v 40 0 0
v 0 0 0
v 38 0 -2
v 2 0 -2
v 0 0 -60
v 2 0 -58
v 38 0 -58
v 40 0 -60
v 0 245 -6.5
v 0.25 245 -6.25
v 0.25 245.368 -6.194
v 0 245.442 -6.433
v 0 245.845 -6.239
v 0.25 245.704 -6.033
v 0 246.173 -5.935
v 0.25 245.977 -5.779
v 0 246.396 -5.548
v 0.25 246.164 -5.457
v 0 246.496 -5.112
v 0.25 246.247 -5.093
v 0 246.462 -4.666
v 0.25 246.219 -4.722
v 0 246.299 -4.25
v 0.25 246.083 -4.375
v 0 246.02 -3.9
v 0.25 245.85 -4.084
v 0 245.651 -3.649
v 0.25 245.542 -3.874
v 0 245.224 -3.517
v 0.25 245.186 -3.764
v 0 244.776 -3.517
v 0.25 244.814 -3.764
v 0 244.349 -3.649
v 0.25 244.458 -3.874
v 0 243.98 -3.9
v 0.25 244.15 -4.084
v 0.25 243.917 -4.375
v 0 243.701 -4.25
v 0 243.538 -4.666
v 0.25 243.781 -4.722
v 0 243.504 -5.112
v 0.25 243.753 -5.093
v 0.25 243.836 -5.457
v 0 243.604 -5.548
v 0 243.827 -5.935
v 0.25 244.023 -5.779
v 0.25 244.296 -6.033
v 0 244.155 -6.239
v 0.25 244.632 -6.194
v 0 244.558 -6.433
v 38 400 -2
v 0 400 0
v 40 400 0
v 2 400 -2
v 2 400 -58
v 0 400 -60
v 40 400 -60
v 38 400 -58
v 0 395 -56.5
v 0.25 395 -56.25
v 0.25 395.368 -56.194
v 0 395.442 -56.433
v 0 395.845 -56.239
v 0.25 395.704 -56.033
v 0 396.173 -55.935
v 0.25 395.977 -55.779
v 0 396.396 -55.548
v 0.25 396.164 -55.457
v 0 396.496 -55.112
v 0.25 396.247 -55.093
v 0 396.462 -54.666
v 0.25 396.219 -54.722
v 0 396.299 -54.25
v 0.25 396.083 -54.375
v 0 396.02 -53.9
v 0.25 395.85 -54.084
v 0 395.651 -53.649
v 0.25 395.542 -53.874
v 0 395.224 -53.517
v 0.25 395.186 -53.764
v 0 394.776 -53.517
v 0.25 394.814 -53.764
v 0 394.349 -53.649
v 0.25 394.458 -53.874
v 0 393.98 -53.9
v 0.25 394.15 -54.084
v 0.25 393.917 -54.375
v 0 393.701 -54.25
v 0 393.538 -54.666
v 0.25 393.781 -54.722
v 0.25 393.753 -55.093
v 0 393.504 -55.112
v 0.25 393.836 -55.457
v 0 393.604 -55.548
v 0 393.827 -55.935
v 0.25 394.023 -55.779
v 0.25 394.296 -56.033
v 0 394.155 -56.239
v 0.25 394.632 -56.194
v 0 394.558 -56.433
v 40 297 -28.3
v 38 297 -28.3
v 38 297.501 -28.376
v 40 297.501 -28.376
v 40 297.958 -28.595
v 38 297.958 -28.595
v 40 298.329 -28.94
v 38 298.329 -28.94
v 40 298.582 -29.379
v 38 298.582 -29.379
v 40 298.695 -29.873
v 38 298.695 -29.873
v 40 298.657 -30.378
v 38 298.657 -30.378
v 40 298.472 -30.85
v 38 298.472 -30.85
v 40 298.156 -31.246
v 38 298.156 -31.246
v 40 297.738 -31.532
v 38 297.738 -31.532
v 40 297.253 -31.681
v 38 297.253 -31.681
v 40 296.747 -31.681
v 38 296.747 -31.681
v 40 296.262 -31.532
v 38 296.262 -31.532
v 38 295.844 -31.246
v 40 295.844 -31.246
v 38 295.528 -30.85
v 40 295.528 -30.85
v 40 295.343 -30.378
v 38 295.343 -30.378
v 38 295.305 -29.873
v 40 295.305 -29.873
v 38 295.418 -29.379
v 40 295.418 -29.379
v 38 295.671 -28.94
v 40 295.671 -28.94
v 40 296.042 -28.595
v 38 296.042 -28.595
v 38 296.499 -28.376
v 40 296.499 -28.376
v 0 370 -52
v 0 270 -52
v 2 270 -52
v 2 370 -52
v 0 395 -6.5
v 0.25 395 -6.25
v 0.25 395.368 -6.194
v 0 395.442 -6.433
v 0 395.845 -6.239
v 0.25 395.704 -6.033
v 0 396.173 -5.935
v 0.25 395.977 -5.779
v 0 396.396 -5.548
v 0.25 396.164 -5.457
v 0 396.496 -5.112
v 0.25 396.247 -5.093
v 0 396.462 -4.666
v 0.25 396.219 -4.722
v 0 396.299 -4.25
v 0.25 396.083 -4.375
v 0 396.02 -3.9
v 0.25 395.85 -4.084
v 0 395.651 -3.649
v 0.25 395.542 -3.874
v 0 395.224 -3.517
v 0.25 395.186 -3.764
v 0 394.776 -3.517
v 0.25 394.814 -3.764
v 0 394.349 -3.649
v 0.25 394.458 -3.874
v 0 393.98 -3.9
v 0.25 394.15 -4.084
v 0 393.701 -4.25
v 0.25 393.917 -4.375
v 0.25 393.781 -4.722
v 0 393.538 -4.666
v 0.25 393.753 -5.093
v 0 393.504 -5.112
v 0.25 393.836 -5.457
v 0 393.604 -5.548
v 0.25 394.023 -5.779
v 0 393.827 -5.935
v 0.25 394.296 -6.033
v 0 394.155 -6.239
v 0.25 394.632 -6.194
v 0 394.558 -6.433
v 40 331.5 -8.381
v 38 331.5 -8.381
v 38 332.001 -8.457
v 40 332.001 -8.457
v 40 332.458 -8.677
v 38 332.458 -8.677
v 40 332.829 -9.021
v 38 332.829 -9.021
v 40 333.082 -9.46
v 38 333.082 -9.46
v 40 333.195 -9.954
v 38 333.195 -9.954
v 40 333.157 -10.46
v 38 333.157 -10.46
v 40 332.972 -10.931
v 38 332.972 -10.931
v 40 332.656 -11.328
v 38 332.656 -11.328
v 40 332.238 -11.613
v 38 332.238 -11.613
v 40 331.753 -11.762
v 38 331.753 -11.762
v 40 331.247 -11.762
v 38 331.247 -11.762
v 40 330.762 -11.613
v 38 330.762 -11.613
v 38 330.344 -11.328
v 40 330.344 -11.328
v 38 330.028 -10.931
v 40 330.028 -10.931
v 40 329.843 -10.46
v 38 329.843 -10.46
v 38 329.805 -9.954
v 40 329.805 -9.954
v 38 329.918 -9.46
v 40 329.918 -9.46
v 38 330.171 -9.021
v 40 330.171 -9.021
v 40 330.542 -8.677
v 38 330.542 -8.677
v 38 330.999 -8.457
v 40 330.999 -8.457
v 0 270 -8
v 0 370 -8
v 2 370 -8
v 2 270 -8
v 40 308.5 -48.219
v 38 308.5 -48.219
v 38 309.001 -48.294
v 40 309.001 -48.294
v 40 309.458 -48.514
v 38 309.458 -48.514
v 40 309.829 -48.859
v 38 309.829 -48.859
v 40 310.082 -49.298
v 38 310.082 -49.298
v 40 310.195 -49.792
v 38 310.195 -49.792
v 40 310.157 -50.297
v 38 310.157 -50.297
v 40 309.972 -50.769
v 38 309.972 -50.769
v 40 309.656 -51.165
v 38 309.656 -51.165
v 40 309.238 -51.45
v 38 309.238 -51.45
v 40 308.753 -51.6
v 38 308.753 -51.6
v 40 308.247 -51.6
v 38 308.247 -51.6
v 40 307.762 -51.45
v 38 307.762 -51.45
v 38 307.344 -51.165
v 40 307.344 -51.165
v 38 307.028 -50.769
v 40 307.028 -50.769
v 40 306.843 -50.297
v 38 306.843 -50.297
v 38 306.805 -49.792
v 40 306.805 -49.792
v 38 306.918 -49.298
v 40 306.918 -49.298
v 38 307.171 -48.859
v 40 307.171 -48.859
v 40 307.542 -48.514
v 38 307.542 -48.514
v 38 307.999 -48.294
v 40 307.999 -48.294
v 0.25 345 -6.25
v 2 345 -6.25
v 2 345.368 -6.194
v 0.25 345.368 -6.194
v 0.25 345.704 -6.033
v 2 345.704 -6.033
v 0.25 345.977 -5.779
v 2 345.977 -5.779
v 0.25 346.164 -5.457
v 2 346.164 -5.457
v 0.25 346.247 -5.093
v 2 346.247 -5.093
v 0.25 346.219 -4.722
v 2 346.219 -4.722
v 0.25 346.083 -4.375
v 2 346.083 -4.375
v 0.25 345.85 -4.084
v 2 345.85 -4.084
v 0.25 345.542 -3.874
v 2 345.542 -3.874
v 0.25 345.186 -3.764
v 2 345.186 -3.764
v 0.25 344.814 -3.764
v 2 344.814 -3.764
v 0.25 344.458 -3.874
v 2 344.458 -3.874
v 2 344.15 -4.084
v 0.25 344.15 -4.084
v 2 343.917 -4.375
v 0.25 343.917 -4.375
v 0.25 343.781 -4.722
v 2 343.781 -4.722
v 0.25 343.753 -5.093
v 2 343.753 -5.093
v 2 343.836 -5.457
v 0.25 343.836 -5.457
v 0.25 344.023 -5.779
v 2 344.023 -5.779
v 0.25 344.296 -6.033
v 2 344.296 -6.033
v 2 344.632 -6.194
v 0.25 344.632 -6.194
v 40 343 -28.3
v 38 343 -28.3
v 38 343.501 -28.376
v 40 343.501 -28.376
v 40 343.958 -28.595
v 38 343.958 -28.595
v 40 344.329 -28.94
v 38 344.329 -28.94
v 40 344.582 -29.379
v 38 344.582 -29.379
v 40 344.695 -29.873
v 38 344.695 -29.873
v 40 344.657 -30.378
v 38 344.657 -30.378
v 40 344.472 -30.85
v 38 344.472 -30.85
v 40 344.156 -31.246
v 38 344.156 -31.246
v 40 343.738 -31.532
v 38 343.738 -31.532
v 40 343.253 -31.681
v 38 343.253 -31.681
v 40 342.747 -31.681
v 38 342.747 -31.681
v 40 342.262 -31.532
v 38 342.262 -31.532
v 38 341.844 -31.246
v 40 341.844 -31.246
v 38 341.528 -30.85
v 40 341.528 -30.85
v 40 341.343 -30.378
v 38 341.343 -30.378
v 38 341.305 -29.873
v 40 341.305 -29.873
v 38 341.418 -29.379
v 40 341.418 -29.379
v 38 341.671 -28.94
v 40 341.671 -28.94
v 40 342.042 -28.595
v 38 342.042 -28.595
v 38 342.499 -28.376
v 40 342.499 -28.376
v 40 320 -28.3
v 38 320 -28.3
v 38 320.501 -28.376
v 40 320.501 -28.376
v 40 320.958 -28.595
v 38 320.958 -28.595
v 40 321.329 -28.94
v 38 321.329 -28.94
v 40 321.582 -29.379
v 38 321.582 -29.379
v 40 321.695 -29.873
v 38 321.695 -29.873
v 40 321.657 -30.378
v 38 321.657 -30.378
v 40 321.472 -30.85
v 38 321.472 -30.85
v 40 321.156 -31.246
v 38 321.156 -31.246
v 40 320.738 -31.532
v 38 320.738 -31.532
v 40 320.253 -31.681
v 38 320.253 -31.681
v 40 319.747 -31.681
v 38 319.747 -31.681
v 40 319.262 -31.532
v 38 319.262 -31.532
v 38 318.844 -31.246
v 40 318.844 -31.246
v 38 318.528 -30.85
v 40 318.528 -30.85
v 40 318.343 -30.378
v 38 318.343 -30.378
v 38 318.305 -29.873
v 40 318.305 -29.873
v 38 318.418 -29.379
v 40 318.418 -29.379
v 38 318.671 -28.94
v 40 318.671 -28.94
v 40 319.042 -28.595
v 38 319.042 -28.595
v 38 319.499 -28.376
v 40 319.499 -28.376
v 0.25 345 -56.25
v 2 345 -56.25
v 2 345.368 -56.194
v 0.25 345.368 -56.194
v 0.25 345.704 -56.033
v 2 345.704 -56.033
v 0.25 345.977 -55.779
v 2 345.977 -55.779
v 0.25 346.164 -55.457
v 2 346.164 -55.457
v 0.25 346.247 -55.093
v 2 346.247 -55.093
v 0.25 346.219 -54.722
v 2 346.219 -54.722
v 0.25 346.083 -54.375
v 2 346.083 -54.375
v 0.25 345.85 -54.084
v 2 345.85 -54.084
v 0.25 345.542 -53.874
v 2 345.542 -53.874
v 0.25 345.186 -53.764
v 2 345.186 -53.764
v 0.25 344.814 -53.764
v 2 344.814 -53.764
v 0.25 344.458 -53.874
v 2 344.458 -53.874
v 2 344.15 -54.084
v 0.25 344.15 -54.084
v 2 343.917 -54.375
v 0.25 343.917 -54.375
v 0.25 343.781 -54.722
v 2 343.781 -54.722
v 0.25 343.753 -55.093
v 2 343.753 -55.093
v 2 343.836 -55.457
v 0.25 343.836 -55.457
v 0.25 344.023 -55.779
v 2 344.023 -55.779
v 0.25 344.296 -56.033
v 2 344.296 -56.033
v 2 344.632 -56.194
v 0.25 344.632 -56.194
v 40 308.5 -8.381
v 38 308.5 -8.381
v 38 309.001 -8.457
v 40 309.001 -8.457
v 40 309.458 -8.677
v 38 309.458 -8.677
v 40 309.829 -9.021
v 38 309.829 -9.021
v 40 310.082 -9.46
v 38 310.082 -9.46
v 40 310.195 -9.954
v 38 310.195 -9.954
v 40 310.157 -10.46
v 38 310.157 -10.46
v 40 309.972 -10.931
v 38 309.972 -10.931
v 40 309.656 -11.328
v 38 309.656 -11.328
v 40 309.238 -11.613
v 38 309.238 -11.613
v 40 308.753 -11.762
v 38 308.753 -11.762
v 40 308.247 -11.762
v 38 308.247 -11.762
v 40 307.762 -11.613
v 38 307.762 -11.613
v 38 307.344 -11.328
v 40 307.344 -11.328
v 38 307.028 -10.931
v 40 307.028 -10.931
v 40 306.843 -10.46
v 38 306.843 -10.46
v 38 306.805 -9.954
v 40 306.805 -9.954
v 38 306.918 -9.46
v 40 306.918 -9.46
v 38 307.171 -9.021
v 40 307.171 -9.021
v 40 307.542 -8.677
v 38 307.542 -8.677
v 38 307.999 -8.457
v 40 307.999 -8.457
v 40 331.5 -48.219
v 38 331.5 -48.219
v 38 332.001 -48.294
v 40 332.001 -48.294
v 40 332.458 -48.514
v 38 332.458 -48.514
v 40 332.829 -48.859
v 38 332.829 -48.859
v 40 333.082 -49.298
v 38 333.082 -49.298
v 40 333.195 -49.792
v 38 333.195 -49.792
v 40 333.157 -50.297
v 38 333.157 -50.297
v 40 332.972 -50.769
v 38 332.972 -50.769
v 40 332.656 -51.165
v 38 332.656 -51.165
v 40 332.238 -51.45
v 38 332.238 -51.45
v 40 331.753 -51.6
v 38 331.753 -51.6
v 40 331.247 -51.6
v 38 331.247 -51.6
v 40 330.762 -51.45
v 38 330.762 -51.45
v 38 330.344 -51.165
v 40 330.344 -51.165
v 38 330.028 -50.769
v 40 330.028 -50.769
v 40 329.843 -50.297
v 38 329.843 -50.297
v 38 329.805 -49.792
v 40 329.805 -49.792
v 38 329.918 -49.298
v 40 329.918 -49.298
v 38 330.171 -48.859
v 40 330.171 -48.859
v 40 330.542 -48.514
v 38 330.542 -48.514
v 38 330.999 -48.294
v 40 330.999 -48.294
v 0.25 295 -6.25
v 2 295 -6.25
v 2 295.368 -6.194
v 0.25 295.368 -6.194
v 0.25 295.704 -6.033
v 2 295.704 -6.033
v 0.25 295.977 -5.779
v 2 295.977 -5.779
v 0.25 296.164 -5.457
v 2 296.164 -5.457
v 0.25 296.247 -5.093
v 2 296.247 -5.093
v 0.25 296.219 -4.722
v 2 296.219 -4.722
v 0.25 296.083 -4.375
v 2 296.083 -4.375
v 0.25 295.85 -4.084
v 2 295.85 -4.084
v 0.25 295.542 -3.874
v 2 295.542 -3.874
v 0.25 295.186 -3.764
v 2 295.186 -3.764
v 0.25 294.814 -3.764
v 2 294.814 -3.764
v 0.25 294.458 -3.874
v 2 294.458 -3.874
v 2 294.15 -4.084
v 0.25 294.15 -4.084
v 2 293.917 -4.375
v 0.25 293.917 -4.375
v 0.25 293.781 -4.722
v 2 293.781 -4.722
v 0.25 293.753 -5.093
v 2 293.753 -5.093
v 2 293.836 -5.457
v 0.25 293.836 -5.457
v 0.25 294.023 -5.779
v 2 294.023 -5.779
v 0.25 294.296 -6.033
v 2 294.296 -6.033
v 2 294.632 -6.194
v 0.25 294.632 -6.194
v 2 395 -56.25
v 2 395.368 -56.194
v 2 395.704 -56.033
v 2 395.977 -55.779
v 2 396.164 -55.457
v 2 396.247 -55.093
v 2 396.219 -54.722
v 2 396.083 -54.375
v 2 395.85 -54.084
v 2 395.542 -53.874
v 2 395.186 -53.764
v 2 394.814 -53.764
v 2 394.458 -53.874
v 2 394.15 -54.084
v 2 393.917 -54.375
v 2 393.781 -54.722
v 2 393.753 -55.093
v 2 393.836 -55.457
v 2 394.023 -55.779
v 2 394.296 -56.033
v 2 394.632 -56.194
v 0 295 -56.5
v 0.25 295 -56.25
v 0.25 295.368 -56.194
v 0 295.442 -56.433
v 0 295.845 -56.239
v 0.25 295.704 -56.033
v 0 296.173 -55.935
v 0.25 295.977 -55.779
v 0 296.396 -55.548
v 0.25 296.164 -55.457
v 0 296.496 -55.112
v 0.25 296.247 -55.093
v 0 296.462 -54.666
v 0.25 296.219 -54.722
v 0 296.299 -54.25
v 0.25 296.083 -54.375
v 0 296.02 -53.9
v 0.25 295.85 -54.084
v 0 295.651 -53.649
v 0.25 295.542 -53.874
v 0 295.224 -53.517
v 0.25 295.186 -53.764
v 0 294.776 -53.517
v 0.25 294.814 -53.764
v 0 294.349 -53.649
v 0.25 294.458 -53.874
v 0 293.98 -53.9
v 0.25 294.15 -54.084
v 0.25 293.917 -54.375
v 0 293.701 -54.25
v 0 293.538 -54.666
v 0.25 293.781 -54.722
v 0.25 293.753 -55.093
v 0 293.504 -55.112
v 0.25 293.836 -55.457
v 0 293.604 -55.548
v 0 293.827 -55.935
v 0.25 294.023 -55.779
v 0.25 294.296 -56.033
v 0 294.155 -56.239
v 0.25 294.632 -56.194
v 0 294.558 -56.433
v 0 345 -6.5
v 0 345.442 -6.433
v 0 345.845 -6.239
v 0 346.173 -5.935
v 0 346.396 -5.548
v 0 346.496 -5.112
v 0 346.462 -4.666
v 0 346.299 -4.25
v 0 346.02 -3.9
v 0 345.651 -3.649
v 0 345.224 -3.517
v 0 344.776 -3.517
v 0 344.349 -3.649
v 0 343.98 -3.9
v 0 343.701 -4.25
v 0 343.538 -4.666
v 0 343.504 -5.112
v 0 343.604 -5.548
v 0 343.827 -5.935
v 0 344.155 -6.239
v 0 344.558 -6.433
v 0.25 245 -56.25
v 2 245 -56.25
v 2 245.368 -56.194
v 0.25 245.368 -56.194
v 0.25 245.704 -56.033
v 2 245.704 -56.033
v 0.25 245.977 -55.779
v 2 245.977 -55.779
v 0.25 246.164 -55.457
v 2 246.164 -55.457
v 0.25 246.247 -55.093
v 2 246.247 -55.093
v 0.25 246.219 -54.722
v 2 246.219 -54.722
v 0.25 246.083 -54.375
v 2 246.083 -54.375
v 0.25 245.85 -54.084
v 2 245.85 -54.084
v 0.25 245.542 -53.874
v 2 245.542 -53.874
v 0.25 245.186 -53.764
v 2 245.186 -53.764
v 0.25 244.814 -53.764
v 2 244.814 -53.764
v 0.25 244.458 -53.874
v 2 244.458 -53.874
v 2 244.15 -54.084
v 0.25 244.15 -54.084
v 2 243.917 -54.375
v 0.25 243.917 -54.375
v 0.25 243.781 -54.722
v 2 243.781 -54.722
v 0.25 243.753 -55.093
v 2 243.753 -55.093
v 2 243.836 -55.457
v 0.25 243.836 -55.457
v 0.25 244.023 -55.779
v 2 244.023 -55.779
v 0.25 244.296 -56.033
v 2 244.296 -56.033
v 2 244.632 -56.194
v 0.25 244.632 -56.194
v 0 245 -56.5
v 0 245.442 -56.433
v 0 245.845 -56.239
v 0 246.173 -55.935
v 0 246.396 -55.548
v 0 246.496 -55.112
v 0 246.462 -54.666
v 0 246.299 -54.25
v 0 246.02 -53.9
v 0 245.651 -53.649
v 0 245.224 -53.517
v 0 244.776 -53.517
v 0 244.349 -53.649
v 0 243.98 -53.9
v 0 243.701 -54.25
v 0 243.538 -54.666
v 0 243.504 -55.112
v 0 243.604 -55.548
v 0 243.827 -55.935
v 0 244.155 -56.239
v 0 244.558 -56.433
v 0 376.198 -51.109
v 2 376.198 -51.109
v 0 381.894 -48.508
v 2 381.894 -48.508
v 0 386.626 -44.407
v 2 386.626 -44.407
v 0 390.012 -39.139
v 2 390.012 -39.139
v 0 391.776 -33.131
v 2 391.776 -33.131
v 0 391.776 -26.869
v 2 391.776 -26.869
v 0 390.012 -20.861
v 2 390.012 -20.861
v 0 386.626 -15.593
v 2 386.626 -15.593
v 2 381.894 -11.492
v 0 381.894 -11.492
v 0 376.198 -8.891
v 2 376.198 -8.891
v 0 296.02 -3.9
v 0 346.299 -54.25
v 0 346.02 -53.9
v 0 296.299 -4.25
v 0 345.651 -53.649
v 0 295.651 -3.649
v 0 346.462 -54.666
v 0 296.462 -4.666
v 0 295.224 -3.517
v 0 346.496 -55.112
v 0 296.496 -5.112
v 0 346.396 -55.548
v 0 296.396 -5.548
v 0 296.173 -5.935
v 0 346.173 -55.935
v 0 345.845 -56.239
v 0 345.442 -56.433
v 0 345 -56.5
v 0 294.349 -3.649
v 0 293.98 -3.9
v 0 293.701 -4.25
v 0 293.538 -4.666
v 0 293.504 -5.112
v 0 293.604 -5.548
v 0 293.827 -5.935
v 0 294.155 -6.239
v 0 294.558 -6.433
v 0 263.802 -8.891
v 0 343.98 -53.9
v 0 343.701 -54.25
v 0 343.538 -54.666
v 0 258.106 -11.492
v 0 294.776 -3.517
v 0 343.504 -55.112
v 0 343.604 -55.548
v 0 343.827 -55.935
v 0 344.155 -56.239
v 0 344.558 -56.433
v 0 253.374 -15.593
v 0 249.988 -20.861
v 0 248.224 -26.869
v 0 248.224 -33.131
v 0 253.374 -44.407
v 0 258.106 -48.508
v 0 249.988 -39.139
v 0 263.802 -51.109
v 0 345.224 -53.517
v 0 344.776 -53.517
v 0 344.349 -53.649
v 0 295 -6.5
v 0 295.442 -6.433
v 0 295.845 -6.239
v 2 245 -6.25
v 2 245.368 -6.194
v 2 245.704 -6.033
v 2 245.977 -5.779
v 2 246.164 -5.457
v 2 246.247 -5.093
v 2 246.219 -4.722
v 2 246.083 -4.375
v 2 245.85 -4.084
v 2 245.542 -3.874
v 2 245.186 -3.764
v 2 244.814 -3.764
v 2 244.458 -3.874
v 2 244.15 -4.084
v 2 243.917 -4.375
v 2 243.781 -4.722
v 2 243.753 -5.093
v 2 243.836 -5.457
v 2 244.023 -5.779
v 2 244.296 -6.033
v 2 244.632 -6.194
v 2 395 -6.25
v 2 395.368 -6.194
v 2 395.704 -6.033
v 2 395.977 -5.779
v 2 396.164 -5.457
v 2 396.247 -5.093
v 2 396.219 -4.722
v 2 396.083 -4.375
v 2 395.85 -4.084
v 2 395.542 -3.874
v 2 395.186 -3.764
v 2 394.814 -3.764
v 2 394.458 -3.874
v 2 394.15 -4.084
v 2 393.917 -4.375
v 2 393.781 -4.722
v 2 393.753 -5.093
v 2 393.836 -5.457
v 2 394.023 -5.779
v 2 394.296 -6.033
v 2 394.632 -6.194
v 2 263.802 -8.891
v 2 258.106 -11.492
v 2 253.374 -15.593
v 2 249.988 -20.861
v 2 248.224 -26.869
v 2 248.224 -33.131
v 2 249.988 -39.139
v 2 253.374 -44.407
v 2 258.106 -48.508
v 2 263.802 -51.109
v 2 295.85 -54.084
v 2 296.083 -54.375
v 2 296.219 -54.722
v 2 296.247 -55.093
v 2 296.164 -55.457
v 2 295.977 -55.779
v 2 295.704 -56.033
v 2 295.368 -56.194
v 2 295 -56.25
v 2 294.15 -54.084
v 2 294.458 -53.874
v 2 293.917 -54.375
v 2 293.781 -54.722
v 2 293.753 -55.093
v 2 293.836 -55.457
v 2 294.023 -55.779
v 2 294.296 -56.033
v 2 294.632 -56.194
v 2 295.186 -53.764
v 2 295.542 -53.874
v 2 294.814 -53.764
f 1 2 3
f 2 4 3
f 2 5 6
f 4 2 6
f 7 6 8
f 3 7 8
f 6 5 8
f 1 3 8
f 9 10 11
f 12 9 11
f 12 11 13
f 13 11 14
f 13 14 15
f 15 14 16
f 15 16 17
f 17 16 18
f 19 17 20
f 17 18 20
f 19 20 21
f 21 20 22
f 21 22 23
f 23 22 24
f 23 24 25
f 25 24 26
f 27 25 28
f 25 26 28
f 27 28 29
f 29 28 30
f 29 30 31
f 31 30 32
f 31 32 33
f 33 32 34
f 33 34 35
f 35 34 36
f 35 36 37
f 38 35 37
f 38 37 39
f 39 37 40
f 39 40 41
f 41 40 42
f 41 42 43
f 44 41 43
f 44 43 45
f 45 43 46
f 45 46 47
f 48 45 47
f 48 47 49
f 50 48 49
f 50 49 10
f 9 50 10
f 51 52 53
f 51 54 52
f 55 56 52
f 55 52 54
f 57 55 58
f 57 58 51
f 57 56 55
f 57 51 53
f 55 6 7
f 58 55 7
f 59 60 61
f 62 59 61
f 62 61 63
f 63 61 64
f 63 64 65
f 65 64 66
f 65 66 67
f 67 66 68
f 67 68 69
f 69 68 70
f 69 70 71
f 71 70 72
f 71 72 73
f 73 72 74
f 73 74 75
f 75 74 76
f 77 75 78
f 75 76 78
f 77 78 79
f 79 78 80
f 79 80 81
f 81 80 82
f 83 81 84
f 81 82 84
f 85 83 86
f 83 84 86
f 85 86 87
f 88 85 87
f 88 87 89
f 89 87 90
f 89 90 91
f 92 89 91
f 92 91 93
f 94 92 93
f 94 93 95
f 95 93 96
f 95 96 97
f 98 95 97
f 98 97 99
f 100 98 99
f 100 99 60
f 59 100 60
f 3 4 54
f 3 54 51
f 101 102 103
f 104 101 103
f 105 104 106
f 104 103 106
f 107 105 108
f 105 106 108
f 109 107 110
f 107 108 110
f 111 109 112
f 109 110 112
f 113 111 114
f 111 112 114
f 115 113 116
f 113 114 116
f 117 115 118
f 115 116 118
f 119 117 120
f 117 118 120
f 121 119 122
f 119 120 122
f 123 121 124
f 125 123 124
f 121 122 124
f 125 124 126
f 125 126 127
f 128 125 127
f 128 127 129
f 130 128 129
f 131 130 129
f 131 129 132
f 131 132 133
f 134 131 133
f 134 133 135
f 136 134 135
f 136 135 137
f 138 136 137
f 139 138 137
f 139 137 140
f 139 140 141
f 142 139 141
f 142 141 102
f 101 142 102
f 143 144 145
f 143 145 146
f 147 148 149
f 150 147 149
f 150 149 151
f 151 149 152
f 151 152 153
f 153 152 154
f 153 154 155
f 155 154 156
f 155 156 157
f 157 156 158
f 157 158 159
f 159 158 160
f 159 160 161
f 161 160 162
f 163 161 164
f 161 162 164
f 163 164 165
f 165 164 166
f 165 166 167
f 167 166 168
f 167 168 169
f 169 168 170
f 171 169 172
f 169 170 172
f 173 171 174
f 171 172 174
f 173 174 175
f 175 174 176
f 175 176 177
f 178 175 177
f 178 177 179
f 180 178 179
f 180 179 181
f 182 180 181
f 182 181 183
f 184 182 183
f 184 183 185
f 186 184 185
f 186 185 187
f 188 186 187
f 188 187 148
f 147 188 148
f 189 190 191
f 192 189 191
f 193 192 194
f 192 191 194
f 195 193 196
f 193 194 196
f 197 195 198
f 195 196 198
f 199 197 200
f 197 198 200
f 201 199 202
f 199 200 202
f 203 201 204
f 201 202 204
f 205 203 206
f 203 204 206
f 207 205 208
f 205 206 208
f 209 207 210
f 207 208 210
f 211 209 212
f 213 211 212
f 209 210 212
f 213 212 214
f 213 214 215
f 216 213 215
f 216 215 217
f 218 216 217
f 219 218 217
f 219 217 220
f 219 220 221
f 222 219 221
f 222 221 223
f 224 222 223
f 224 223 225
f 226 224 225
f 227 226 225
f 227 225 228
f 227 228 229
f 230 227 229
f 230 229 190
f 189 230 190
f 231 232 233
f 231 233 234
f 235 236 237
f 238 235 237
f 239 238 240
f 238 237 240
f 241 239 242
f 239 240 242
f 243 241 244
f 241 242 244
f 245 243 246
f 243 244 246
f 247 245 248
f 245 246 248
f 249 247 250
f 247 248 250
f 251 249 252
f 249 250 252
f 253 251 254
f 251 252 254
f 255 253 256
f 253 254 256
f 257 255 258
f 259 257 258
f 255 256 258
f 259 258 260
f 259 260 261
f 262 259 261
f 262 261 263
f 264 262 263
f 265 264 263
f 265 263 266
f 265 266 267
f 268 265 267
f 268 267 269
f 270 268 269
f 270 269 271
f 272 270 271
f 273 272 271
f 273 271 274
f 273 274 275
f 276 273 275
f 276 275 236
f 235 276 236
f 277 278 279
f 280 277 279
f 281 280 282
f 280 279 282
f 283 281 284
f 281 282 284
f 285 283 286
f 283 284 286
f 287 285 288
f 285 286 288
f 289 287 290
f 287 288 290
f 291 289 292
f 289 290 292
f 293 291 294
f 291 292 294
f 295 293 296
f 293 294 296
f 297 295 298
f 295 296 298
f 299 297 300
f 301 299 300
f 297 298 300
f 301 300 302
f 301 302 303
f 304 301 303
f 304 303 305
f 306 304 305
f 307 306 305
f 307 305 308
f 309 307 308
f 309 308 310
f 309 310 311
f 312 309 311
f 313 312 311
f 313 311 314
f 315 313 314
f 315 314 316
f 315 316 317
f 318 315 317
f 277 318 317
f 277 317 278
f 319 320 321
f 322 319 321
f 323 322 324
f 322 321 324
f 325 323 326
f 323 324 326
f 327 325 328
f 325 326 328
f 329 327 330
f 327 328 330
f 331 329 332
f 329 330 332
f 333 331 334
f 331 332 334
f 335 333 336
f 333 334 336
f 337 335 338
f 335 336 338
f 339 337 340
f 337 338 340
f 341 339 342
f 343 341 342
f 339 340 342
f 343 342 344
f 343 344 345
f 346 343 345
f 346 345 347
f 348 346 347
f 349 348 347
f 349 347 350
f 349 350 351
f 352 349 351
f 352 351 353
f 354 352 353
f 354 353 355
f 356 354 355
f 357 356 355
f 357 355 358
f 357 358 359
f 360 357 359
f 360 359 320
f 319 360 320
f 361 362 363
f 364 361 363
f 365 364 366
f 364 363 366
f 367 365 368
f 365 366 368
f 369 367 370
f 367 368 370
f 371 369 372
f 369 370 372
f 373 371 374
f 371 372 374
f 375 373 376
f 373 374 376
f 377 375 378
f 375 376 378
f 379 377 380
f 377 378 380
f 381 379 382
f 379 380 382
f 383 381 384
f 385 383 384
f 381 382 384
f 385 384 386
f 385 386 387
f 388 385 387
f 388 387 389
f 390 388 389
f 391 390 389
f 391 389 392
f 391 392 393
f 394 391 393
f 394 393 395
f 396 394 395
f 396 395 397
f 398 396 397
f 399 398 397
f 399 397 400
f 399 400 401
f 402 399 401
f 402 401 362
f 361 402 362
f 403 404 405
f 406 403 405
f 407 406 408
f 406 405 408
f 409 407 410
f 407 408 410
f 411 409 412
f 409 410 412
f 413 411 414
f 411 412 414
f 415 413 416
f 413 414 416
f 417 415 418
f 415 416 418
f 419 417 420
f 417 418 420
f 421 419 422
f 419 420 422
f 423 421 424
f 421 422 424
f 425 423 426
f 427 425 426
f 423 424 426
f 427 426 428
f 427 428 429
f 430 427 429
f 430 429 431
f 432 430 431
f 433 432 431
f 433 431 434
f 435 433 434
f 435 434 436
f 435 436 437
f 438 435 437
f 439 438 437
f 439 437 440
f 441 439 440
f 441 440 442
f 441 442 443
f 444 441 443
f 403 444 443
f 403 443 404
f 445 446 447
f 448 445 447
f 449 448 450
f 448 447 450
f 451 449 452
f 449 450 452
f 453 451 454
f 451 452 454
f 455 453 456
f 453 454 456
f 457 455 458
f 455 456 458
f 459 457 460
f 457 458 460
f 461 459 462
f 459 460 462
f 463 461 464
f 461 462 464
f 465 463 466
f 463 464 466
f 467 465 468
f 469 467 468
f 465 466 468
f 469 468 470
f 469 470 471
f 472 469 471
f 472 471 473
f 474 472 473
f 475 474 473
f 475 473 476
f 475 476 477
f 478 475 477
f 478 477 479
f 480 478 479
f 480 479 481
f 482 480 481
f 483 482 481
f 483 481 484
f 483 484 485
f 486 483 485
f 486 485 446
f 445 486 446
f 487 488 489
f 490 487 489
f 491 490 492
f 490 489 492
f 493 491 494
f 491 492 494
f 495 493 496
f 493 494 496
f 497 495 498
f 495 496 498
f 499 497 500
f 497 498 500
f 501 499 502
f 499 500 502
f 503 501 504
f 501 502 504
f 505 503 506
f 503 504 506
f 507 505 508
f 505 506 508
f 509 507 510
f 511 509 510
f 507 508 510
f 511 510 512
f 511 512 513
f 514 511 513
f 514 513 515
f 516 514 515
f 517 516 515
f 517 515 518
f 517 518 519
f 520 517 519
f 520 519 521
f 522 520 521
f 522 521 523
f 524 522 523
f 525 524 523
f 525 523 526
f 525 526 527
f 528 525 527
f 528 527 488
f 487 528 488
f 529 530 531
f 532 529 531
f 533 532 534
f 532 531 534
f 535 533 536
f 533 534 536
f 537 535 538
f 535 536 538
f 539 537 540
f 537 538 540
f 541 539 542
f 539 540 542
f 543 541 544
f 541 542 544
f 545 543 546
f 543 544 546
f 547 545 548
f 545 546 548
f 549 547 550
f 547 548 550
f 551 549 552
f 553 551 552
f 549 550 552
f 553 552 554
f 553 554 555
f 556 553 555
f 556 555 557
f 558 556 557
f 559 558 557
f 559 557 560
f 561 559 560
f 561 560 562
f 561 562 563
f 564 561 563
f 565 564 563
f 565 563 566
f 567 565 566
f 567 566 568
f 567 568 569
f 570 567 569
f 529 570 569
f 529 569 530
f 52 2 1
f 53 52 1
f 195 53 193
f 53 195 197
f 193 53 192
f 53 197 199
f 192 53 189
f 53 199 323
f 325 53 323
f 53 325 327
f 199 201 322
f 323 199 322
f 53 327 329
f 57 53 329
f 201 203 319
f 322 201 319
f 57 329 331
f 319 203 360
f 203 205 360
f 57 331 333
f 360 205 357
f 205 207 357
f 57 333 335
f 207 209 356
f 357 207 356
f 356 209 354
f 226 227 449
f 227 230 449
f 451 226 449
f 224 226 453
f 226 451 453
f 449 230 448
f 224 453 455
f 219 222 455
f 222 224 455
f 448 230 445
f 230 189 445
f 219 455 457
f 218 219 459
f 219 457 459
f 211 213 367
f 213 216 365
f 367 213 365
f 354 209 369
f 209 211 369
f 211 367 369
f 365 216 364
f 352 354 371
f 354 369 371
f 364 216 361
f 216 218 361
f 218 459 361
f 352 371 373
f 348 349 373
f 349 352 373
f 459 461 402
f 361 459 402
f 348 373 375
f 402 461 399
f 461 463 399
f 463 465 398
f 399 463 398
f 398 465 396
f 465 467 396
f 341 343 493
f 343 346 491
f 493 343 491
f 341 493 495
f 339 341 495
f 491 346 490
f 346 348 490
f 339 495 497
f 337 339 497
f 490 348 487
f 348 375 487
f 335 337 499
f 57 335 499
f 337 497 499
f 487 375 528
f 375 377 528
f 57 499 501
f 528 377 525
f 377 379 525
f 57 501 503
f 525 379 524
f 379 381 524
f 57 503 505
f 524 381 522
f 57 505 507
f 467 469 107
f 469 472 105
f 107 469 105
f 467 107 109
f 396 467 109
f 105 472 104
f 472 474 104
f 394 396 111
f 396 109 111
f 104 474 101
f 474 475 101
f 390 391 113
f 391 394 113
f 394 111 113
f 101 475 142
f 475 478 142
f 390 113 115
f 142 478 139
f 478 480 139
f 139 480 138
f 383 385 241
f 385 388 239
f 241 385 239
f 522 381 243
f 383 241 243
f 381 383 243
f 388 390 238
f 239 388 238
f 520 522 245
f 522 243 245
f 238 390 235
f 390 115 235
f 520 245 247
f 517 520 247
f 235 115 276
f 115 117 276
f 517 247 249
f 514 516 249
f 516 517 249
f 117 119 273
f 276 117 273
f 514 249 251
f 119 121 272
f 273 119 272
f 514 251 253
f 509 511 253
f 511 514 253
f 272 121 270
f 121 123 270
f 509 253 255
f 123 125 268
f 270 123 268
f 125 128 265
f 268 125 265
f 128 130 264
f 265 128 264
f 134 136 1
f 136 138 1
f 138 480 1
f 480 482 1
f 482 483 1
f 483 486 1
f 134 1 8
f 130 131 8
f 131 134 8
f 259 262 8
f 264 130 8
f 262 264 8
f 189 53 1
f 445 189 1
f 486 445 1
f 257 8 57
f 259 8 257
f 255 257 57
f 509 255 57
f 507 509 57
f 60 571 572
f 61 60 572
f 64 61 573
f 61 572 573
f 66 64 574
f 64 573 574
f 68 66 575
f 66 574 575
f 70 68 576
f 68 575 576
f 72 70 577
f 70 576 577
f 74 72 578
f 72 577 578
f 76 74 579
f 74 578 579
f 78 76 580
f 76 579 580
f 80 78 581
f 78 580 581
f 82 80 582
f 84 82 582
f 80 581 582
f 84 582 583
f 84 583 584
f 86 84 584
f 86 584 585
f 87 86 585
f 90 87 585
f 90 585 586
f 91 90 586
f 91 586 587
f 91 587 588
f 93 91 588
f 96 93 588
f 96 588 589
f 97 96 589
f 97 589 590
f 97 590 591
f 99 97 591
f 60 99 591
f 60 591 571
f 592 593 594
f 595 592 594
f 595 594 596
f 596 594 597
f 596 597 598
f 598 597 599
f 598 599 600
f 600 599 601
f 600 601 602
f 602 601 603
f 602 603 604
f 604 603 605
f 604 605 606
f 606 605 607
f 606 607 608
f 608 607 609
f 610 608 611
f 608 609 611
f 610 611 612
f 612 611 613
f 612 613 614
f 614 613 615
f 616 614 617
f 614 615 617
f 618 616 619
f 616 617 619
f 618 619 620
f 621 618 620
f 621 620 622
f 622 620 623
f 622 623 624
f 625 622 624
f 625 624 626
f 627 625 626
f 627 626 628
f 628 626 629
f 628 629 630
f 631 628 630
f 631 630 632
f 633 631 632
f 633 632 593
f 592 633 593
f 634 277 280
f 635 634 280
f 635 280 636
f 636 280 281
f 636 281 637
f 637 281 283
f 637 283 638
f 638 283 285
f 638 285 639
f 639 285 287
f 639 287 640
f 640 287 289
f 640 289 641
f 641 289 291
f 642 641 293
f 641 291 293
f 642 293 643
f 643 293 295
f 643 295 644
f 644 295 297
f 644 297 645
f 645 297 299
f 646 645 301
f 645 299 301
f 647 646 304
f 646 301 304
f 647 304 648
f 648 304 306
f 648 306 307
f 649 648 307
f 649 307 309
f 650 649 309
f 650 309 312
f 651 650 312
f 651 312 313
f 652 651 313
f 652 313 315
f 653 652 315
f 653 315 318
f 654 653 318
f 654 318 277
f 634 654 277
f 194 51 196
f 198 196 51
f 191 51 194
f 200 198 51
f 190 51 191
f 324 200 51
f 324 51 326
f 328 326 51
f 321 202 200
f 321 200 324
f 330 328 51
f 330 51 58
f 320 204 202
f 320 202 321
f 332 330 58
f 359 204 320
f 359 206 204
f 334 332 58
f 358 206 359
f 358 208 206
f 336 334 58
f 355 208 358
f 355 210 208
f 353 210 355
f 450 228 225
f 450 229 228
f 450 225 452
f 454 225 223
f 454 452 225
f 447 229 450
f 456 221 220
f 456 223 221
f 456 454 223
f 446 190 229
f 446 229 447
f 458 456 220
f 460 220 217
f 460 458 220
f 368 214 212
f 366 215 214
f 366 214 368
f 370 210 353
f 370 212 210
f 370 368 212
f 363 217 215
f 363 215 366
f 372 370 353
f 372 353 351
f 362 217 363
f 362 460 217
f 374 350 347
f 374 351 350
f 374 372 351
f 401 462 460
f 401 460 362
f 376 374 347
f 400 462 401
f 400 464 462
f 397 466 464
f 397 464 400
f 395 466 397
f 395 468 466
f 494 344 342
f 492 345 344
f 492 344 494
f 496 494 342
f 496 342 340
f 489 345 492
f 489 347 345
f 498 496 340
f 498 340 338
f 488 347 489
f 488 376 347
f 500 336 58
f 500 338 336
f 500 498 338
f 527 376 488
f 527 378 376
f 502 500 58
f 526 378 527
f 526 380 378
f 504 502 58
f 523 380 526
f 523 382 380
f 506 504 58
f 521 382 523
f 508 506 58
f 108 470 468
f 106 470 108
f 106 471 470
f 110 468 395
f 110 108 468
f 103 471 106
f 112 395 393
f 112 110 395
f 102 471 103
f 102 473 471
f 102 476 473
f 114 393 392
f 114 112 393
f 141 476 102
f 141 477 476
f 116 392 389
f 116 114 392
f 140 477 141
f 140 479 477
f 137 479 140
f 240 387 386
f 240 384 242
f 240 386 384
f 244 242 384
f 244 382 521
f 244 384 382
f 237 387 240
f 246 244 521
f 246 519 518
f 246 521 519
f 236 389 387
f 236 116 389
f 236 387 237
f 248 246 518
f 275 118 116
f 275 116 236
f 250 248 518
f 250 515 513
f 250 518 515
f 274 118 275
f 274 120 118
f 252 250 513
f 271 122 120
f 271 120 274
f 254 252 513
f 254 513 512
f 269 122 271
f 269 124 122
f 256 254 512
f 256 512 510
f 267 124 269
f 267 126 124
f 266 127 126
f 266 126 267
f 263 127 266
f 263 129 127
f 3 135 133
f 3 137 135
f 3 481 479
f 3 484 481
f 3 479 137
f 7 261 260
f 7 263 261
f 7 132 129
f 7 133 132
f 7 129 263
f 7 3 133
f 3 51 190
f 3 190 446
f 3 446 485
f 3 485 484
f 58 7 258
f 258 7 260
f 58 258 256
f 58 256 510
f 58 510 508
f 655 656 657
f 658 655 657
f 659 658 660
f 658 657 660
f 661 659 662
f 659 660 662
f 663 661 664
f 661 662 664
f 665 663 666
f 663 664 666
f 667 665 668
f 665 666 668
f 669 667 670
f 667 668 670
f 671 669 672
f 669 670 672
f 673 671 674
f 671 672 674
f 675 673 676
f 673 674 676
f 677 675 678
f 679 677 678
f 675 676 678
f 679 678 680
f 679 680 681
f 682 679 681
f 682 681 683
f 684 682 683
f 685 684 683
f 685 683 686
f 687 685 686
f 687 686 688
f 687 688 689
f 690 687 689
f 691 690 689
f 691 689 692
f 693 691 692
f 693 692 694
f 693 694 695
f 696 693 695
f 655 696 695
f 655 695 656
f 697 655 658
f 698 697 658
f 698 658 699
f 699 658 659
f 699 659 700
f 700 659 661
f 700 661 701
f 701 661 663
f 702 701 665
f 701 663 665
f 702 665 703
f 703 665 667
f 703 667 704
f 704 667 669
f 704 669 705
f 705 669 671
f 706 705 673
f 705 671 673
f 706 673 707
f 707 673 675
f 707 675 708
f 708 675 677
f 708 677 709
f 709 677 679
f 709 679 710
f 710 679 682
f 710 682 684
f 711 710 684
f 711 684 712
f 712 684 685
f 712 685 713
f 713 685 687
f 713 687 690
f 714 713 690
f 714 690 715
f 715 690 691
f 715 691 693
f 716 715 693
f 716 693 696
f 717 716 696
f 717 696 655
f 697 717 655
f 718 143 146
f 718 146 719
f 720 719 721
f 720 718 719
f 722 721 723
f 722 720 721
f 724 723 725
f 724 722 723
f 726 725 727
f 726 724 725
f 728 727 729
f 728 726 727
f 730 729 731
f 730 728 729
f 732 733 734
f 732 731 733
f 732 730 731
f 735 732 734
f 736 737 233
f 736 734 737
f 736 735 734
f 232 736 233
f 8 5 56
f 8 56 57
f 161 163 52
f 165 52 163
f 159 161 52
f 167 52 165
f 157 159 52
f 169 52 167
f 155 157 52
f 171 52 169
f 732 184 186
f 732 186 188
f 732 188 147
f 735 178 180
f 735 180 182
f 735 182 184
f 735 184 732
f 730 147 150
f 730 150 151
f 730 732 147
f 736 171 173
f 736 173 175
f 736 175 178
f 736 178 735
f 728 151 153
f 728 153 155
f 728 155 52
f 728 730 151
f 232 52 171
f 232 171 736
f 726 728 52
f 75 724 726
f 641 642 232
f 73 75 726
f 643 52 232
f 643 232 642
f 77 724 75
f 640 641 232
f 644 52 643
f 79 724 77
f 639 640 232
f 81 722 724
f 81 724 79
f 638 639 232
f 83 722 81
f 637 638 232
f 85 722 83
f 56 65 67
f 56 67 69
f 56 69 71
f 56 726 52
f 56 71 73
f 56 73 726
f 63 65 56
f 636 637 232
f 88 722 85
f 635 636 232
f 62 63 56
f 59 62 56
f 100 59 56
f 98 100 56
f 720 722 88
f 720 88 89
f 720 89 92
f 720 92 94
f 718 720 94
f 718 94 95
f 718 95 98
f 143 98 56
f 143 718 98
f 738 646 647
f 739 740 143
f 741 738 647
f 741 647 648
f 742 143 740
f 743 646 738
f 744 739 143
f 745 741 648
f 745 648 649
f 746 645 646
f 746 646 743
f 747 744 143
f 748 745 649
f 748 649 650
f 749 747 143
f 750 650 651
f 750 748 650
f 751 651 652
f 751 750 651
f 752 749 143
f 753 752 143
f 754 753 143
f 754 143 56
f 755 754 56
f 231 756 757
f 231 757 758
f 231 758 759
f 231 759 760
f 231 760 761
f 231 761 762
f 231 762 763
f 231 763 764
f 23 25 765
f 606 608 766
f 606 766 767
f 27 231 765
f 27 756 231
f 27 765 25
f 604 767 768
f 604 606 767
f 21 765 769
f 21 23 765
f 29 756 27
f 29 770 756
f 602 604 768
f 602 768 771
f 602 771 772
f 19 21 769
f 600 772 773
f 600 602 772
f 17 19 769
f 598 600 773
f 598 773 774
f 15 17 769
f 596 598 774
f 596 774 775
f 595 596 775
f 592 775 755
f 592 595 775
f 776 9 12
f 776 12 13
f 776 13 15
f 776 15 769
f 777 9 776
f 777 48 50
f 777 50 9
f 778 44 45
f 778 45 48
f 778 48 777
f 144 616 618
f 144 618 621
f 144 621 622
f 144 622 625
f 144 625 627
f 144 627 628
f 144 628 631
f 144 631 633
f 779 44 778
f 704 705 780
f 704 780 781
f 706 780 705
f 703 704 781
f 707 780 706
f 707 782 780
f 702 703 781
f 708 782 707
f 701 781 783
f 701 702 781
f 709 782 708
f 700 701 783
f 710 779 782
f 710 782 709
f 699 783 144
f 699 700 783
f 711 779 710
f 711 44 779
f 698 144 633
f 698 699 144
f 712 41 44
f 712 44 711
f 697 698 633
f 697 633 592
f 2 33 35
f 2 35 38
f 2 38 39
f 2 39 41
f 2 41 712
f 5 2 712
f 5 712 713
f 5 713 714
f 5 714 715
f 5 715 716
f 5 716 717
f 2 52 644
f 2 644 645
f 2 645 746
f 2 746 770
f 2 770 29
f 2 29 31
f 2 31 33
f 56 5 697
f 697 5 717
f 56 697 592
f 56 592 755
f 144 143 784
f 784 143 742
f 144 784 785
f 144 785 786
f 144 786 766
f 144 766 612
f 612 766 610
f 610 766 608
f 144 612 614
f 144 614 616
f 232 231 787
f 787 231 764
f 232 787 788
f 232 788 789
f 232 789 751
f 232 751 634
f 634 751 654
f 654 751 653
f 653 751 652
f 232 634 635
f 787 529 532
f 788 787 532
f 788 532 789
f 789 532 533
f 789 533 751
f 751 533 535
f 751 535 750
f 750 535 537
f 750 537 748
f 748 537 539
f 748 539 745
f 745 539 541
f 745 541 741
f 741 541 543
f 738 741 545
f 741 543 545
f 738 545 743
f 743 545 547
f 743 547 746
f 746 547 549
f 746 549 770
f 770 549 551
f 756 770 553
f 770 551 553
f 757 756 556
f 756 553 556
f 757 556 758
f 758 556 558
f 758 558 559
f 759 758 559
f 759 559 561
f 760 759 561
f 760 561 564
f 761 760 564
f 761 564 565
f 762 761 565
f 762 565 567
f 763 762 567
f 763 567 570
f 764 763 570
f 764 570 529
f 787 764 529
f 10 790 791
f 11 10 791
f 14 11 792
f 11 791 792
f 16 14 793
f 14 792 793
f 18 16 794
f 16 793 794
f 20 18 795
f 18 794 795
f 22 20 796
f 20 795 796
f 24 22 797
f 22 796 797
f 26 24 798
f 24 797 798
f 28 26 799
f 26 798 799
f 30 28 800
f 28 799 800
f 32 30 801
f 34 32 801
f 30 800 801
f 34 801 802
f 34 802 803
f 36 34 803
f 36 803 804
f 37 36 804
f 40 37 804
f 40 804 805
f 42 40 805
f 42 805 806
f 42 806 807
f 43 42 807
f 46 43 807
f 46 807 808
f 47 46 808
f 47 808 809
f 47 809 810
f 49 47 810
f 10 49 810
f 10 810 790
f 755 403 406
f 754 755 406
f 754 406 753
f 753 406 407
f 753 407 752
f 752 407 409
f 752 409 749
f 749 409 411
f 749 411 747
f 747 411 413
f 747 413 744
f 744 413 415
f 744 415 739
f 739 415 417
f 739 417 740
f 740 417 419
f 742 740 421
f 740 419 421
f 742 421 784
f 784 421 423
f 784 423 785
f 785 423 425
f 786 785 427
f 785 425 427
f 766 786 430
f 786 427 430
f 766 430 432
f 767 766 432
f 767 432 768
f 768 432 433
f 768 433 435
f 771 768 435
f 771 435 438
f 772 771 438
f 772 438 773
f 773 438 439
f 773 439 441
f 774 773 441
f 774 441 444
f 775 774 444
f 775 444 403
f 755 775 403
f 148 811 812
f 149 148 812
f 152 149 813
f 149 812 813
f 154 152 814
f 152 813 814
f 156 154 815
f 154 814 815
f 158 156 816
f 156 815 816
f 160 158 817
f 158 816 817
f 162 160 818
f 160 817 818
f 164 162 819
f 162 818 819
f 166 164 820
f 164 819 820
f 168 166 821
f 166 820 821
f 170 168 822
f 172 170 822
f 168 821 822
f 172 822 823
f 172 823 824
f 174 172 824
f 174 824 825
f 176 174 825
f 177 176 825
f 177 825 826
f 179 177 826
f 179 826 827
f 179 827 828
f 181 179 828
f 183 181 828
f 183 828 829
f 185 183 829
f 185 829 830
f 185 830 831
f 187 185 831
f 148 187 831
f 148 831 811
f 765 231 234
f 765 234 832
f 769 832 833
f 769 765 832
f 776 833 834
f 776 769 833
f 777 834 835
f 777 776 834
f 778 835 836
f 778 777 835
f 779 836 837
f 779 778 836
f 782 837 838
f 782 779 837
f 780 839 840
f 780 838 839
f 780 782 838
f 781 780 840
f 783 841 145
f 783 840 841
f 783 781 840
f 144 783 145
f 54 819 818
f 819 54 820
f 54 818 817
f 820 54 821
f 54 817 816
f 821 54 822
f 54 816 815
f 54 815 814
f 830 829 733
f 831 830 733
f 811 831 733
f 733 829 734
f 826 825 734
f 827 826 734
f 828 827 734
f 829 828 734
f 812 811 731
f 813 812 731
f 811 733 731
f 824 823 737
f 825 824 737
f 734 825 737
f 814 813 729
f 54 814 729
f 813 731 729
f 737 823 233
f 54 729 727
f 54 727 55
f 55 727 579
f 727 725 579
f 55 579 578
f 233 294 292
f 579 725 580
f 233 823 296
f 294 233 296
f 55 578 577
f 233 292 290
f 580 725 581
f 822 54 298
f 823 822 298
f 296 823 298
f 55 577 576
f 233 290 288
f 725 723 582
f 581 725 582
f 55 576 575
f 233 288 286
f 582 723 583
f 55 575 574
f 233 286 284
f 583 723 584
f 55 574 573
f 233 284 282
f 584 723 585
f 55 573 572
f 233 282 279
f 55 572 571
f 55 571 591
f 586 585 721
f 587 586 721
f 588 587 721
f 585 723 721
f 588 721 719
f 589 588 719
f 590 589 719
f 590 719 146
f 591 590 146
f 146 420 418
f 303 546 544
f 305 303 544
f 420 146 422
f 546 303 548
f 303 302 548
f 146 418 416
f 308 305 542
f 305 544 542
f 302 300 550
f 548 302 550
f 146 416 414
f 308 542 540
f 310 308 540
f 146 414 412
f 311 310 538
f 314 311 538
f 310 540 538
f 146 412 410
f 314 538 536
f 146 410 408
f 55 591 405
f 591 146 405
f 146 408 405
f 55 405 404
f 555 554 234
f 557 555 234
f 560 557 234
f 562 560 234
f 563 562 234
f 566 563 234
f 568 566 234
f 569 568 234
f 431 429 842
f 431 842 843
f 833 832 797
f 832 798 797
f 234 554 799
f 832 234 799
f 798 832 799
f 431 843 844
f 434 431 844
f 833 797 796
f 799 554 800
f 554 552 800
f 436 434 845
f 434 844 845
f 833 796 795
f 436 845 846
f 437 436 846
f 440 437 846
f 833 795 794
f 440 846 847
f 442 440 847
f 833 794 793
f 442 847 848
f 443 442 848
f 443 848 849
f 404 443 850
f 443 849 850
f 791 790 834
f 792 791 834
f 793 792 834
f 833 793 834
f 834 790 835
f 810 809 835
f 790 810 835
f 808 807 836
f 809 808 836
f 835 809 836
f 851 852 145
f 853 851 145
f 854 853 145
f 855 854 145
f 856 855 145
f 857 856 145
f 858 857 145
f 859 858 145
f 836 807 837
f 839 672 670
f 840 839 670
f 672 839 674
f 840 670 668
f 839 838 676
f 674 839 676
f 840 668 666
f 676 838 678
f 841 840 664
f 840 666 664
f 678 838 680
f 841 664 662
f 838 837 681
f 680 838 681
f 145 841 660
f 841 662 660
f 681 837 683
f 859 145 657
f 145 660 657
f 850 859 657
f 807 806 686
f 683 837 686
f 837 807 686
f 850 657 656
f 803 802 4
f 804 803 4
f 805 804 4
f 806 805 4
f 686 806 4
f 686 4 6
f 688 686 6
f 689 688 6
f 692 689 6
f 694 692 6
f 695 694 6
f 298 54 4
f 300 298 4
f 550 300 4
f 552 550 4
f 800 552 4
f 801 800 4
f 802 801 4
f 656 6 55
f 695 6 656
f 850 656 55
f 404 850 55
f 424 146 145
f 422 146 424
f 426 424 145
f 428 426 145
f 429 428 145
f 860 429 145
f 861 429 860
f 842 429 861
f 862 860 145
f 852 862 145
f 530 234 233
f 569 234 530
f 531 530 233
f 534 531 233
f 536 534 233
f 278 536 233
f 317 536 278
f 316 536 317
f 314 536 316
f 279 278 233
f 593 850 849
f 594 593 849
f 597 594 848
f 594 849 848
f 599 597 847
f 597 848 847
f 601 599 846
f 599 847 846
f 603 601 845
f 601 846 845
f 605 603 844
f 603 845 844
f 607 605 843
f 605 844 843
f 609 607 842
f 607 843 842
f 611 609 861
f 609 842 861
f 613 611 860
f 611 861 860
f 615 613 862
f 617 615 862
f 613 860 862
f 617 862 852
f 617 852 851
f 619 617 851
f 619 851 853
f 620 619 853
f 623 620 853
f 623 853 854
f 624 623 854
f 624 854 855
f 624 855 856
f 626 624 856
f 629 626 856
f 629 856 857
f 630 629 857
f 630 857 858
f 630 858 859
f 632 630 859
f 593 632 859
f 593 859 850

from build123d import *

# Parameters (mm, degrees)
SKETCH1_W                         = 40
SKETCH1_H                         = 60
SKETCH1_W_2                       = 36
SKETCH1_H_2                       = 56
BOSS_EXTRUDE1_DEPTH               = 400
M3_CLEARANCE_HOLE1_D              = 3.4
CUT_EXTRUDE1_DEPTH                = 3
TAP_DRILL_FOR_M3_TAP1_D           = 2.5
TAP_DRILL_FOR_M3_TAP1_DEPTH       = 2
TAP_DRILL_FOR_M3_TAP1_CSINK_D     = 3
TAP_DRILL_FOR_M3_TAP1_CSINK_ANGLE = 90


with BuildPart() as part:
    # Sketch1 → Boss-Extrude1 (new body)
    with BuildSketch(Plane(origin=(0, 0, 0), x_dir=(1, 0, 0), z_dir=(0, 1, 0))):
        with Locations((20, 30)):
            Rectangle(SKETCH1_W, SKETCH1_H)
        with Locations((20, 30)):
            Rectangle(SKETCH1_W_2, SKETCH1_H_2, mode=Mode.SUBTRACT)
    extrude(amount=BOSS_EXTRUDE1_DEPTH)

    # M3 Clearance Hole1 (through all)
    with Locations(Plane(origin=(40, 0, 0), x_dir=(0, 0, -1), z_dir=(1, 0, 0))):
        with Locations((30, 320), (30, 343), (49.918584287, 331.5), (49.918584287, 308.5), (30, 297), (10.081415713, 308.5), (10.081415713, 331.5)):
            Hole(M3_CLEARANCE_HOLE1_D / 2)

    # Sketch4 → Cut-Extrude1 (cut)
    with BuildSketch(Plane.ZY):
        with BuildLine():
            Line((-52, 270), (-52, 370))
            ThreePointArc((-52, 370), (-30, 392), (-8, 370))
            Line((-8, 370), (-8, 270))
            ThreePointArc((-8, 270), (-30, 248), (-52, 270))
        make_face()
    extrude(amount=-CUT_EXTRUDE1_DEPTH, mode=Mode.SUBTRACT)

    # Tap Drill for M3 Tap1
    with Locations(Plane.ZY):
        with Locations((-5, 245), (-55, 395), (-55, 245), (-55, 345), (-55, 295), (-5, 395), (-5, 345), (-5, 295)):
            CounterSinkHole(TAP_DRILL_FOR_M3_TAP1_D / 2, TAP_DRILL_FOR_M3_TAP1_CSINK_D / 2, depth=TAP_DRILL_FOR_M3_TAP1_DEPTH, counter_sink_angle=TAP_DRILL_FOR_M3_TAP1_CSINK_ANGLE)


solid = part.part
